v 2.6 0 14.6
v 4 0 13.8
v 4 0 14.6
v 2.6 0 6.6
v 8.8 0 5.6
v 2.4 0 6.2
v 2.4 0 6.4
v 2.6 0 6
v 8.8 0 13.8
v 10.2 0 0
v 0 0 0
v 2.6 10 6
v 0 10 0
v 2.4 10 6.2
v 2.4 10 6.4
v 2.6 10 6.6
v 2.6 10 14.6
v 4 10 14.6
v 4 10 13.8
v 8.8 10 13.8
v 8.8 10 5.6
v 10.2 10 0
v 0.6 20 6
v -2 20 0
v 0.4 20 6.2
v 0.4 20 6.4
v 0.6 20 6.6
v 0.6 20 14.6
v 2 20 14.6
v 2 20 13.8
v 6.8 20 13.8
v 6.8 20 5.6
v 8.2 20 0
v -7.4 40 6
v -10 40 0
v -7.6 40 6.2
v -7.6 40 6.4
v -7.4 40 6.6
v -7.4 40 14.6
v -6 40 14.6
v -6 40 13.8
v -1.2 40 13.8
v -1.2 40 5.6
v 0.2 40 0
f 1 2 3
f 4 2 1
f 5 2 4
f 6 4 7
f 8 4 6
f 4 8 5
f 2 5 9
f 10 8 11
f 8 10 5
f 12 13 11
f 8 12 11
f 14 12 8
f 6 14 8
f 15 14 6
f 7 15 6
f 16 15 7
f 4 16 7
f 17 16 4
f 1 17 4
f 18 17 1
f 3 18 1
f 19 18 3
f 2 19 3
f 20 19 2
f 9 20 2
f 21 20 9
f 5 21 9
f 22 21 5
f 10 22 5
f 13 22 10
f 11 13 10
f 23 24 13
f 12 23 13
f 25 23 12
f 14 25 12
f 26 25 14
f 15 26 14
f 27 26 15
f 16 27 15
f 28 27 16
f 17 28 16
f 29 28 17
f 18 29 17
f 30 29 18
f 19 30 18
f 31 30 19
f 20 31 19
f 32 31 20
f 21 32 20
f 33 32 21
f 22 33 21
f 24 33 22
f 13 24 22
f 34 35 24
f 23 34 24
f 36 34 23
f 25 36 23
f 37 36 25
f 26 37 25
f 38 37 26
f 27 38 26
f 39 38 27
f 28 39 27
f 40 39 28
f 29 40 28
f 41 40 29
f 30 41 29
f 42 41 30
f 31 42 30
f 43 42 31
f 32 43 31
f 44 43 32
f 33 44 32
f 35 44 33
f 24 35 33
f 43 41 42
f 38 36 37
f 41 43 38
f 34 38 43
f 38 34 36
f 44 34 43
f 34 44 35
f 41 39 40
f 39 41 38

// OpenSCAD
// file: extrusion.scad
/*
fn=32;

skin([
	transform(translation([0,0,0]), rounded_rectangle_profile([2,4],fn=fn,r=.5)),
	transform(translation([0,0,2]), rounded_rectangle_profile([2,4],fn=fn,r=.5)),
	transform(translation([0,0,3]), circle_profile(fn=fn,r=0.5)),
	transform(translation([0,0,4]), circle_profile(fn=fn,r=0.5)),
	transform(translation([0,0,4]), circle_profile(fn=fn,r=0.6)),
	transform(translation([0,0,5]), circle_profile(fn=fn,r=0.5)),
	transform(translation([0,0,5]), circle_profile(fn=fn,r=0.6)),
	transform(translation([0,0,6]), circle_profile(fn=fn,r=0.5)),
	transform(translation([0,0,6]), circle_profile(fn=fn,r=0.6)),
	transform(translation([0,0,7]), circle_profile(fn=fn,r=0.5)),
]);


rotate([90,0,0]) 
translate([0,0,3])
difference() {
	skin(morph(
		profile1=rectangle_profile([2,.2]),
		profile2=transform(translation([0,0,3]), circle_profile(fn=64,r=0.5)),
		slices=40)
	);
	
	skin(morph(
		profile1=transform(translation([0,0,-.01]), rectangle_profile([1.9,0.1])),
		profile2=transform(translation([0,0,3.01]), circle_profile(fn=64,r=0.45)),
		slices=40)
	);
}
*/

function circle_profile(r=1,fn=32) = [
	for (i = [0:fn-1]) 
		let(a = i/fn*360) 
			r*[cos(a),sin(a)]
];

function rectangle_profile(size=[1,1]) = [	
	// The first point is the anchor point, put it on the point corresponding to [cos(0),sin(0)]
	[ size[0]/2,  0], 
	[ size[0]/2,  size[1]/2],
	[-size[0]/2,  size[1]/2],
	[-size[0]/2, -size[1]/2],
	[ size[0]/2, -size[1]/2],
];

function rounded_rectangle_profile(size=[1,1],r=1,fn=32) = [
	for (index = [0:fn-1])
		let(a = index/fn*360) 
			r * [cos(a), sin(a)] 
			+ sign_x(index, fn) * [size[0]/2-r,0]
			+ sign_y(index, fn) * [0,size[1]/2-r]
];

function sign_x(i,n) = 
	i < n/4 || i > n-n/4  ?  1 :
	i > n/4 && i < n-n/4  ? -1 :
	0;

function sign_y(i,n) = 
	i > 0 && i < n/2  ?  1 :
	i > n/2 ? -1 :
	0;

// transform the array of points in profile with a given transformation matrix
function transform(transformation, profile) = [
	for(p = profile) project(transform_point(p, transformation))
];

// A translation matrix
function translation(xyz=[0,0,0]) = [[1,0,0,xyz[0]],[0,1,0,xyz[1]],[0,0,1,len(xyz)>=3?xyz[2]:0],[0,0,0,1]];
// etc... (TODO)

function interpolate_profile(profile1, profile2, t) = (1-t) * profile1 + t * profile2;

// Morph two profile
function morph(profile1, profile2, slices=1, fn=0) = morph0(
	augment_profile(make_3d(profile1),max(len(profile1),len(profile2),fn)),
	augment_profile(make_3d(profile2),max(len(profile1),len(profile2),fn)),
	slices
);

function morph0(profile1, profile2, slices=1) = [
	for(index = [0:slices-1])
		interpolate_profile(profile1, profile2, index/(slices-1))
];

// Skin a set of profiles with a polyhedral mesh
module skin(profiles, loop=false /* unimplemented */) {
	P = max_len(profiles);
	N = len(profiles);

	profiles = [ 
		for (p = profiles)
			for (pp = augment_profile(make_3d(p),P))
				pp
	];

	function quad(i,P,o) = [[o+i, o+i+P, o+i%P+P+1], [o+i, o+i%P+P+1, o+i%P+1]];

	function profile_triangles(tindex) = [
		for (index = [0:P-1]) 
			let (qs = quad(index+1, P, P*(tindex-1)-1)) 
				for (q = qs) q
	];

    triangles = [ 
		for(index = [1:N-1])
        	for(t = profile_triangles(index)) 
				t
	];
	
	start_cap = [range([0:P-1])];
	end_cap   = [range([P*N-1 : -1 : P*(N-1)])];

	polyhedron(points=profiles, faces=concat(start_cap, triangles, end_cap));
}




//// Some random generic functions

// Convert between cartesian and homogenous coordinates
function project(x) = subarray(x,end=len(x)-1) / x[len(x)-1];
function unproject(x) = concat(x,1);

// Reverses arr
function reverse(arr) = [for (i = [len(arr)-1:-1:0]) arr[i]];

// Generates an array with n copies of value (default 0)
function dup(value=0,n) = [for (i = [1:n]) value];

// Find the index of the maximum element of arr
function max_element(arr,ma_,ma_i_=-1,i_=0) = i_ >= len(arr) ? ma_i_ :
	i_ == 0 || arr[i_] > ma_ ? max_element(arr,arr[i_],i_,i_+1) : max_element(arr,ma_,ma_i_,i_+1);

// Extract a subarray from index begin (inclusive) to end (exclusive)
function subarray(arr,begin=0,end=-1) = [
	let(end = end < 0 ? len(arr) : end)
		for (i = [begin : 1 : end-1])
			arr[i]
];

// Returns a copy of arr with the element at index i set to x
function set(arr,i,x) = [
	for (i_=[0:len(arr)-1])
		i == i_ ? x : arr[i_]
];

// flatten an array
function flatten(arr) = [ for (vs = arr) for (v = vs) v ];
//// Range functions

// Expand a range into an array, e.g. range([1:5]) = [1,2,3,4,5];
function range(r) = [ for(x=r) x ];

// Augments the profile with steiner points making the total number of vertices n 
function augment_profile(profile, n) = 
	subdivide(profile,insert_extra_vertices_0([profile_lengths(profile),dup(0,len(profile))],n-len(profile))[1]);

// The area of a profile
//function area(p, index_=0) = index_ >= len(p) ? 0 :
function pseudo_centroid(p,index_=0) = index_ >= len(p) ? [0,0,0] :
	p[index_]/len(p) + pseudo_centroid(p,index_+1);


//// Nongeneric helper functions

function profile_distance(p1,p2) = norm(pseudo_centroid(p1) - pseudo_centroid(p2));

function rate(profiles) = [ 
	for (index = [0:len(profiles)-2]) [
		profile_length(profiles[index+1]) - profile_length(profiles[index]), 
     	profile_distance(profiles[index], profiles[index+1])
    ]
];

function profiles_lengths(profiles) = [ for (p = profiles) profile_length(p) ];

function profile_segment_length(profile,i) = norm(profile[(i+1)%len(profile)] - profile[i]);

function profile_lengths(profile) = [ 
	for (i = [0:len(profile)-1])
		profile_segment_length(profile,i)
];

function profile_length(profile,i=0) = i >= len(profile) ? 0 :
	 profile_segment_length(profile, i) + profile_length(profile, i+1);

function expand_profile_vertices(profile,n=32) = len(profile) >= n ? profile : expand_profile_vertices_0(profile,profile_length(profile),n);

function increment(arr,i,x=1) = set(arr,i,arr[i]+x);

function distribute_extra_vertex(lengths_count,ma_=-1) = ma_<0 ? distribute_extra_vertex(lengths_count, max_element(lengths_count[0])) :
	concat([set(lengths_count[0],ma_,lengths_count[0][ma_] * (lengths_count[1][ma_]+1) / (lengths_count[1][ma_]+2))], [increment(lengths_count[1],max_element(lengths_count[0]),1)]);

function insert_extra_vertices_0(lengths_count,n_extra) = n_extra <= 0 ? lengths_count : 
	insert_extra_vertices_0(distribute_extra_vertex(lengths_count),n_extra-1);

function transform_point(p, T) = len(p)+1 < len(T) ? transform_point(concat(p,0),T) : 
                                 len(p)   < len(T) ? transform_point(concat(p,1),T) : 
                                 T * p;

function max_len(arr,index_=0,ma_=0) = index_ >= len(arr) ? ma_ :
	max_len(arr,index_+1,max(ma_,len(arr[index_])));

function interpolate(a,b,subdivisions) = [
	for (index = [0:subdivisions-1])
		let(t = index/subdivisions)
			a*(1-t)+b*t
];

function subdivide(profile,subdivisions) = let (N=len(profile)) [
	for (i = [0:N-1])
		let(n = len(subdivisions)>0 ? subdivisions[i] : subdivisions)
			for (p = interpolate(profile[i],profile[(i+1)%N],n+1))
				p
];

function make_3d_point(p) = len(p) < 3 ? concat(p,0) : p;

function make_3d(arr) = [ for(a = arr) make_3d_point(a) ];
// main file
use <extrusion.scad>;

//p0 = [[0.000000, 297.000000],[2.600000, 291.000000],[2.400000, 290.800000],[2.400000, 290.600000],[2.600000, 290.400000],[2.600000, 282.400000],[4.000000, 282.400000],[4.000000, 283.200000],[8.800000, 283.200000],[8.800000, 291.400000],[10.200000, 297.000000]];
p0 = [[0.000000, 0.000000],[2.600000, -6.000000],[2.400000, -6.200000],[2.400000, -6.400000],[2.600000, -6.600000],[2.600000, -14.600000],[4.000000, -14.600000],[4.000000, -13.800000],[8.800000, -13.800000],[8.800000, -5.600000],[10.200000, -0.000000]];
//p1 = transform(rotation([90, 0, 0]), p0);

module base() {
	//profil();

	rotate([-90,0,0])
	skin([transform(translation([0,0,0]), p0),
		  transform(translation([0,0,10]), p0),
		  transform(translation([-2,0,20]), p0),
		  transform(translation([-10,0,40]), p0)
		 ]);

	// skin([
	// 	transform(translation([0, 0,0]), profil()),
	// 	transform(translation([0,10,0]), profil())
	// ]);
	// fn=32;

	// skin([
	// 	transform(translation([0,0,0]), rounded_rectangle_profile([2,4],fn=fn,r=.5)),
	// 	transform(translation([0,0,2]), rounded_rectangle_profile([2,4],fn=fn,r=.5))
	// ]);


}

base();
